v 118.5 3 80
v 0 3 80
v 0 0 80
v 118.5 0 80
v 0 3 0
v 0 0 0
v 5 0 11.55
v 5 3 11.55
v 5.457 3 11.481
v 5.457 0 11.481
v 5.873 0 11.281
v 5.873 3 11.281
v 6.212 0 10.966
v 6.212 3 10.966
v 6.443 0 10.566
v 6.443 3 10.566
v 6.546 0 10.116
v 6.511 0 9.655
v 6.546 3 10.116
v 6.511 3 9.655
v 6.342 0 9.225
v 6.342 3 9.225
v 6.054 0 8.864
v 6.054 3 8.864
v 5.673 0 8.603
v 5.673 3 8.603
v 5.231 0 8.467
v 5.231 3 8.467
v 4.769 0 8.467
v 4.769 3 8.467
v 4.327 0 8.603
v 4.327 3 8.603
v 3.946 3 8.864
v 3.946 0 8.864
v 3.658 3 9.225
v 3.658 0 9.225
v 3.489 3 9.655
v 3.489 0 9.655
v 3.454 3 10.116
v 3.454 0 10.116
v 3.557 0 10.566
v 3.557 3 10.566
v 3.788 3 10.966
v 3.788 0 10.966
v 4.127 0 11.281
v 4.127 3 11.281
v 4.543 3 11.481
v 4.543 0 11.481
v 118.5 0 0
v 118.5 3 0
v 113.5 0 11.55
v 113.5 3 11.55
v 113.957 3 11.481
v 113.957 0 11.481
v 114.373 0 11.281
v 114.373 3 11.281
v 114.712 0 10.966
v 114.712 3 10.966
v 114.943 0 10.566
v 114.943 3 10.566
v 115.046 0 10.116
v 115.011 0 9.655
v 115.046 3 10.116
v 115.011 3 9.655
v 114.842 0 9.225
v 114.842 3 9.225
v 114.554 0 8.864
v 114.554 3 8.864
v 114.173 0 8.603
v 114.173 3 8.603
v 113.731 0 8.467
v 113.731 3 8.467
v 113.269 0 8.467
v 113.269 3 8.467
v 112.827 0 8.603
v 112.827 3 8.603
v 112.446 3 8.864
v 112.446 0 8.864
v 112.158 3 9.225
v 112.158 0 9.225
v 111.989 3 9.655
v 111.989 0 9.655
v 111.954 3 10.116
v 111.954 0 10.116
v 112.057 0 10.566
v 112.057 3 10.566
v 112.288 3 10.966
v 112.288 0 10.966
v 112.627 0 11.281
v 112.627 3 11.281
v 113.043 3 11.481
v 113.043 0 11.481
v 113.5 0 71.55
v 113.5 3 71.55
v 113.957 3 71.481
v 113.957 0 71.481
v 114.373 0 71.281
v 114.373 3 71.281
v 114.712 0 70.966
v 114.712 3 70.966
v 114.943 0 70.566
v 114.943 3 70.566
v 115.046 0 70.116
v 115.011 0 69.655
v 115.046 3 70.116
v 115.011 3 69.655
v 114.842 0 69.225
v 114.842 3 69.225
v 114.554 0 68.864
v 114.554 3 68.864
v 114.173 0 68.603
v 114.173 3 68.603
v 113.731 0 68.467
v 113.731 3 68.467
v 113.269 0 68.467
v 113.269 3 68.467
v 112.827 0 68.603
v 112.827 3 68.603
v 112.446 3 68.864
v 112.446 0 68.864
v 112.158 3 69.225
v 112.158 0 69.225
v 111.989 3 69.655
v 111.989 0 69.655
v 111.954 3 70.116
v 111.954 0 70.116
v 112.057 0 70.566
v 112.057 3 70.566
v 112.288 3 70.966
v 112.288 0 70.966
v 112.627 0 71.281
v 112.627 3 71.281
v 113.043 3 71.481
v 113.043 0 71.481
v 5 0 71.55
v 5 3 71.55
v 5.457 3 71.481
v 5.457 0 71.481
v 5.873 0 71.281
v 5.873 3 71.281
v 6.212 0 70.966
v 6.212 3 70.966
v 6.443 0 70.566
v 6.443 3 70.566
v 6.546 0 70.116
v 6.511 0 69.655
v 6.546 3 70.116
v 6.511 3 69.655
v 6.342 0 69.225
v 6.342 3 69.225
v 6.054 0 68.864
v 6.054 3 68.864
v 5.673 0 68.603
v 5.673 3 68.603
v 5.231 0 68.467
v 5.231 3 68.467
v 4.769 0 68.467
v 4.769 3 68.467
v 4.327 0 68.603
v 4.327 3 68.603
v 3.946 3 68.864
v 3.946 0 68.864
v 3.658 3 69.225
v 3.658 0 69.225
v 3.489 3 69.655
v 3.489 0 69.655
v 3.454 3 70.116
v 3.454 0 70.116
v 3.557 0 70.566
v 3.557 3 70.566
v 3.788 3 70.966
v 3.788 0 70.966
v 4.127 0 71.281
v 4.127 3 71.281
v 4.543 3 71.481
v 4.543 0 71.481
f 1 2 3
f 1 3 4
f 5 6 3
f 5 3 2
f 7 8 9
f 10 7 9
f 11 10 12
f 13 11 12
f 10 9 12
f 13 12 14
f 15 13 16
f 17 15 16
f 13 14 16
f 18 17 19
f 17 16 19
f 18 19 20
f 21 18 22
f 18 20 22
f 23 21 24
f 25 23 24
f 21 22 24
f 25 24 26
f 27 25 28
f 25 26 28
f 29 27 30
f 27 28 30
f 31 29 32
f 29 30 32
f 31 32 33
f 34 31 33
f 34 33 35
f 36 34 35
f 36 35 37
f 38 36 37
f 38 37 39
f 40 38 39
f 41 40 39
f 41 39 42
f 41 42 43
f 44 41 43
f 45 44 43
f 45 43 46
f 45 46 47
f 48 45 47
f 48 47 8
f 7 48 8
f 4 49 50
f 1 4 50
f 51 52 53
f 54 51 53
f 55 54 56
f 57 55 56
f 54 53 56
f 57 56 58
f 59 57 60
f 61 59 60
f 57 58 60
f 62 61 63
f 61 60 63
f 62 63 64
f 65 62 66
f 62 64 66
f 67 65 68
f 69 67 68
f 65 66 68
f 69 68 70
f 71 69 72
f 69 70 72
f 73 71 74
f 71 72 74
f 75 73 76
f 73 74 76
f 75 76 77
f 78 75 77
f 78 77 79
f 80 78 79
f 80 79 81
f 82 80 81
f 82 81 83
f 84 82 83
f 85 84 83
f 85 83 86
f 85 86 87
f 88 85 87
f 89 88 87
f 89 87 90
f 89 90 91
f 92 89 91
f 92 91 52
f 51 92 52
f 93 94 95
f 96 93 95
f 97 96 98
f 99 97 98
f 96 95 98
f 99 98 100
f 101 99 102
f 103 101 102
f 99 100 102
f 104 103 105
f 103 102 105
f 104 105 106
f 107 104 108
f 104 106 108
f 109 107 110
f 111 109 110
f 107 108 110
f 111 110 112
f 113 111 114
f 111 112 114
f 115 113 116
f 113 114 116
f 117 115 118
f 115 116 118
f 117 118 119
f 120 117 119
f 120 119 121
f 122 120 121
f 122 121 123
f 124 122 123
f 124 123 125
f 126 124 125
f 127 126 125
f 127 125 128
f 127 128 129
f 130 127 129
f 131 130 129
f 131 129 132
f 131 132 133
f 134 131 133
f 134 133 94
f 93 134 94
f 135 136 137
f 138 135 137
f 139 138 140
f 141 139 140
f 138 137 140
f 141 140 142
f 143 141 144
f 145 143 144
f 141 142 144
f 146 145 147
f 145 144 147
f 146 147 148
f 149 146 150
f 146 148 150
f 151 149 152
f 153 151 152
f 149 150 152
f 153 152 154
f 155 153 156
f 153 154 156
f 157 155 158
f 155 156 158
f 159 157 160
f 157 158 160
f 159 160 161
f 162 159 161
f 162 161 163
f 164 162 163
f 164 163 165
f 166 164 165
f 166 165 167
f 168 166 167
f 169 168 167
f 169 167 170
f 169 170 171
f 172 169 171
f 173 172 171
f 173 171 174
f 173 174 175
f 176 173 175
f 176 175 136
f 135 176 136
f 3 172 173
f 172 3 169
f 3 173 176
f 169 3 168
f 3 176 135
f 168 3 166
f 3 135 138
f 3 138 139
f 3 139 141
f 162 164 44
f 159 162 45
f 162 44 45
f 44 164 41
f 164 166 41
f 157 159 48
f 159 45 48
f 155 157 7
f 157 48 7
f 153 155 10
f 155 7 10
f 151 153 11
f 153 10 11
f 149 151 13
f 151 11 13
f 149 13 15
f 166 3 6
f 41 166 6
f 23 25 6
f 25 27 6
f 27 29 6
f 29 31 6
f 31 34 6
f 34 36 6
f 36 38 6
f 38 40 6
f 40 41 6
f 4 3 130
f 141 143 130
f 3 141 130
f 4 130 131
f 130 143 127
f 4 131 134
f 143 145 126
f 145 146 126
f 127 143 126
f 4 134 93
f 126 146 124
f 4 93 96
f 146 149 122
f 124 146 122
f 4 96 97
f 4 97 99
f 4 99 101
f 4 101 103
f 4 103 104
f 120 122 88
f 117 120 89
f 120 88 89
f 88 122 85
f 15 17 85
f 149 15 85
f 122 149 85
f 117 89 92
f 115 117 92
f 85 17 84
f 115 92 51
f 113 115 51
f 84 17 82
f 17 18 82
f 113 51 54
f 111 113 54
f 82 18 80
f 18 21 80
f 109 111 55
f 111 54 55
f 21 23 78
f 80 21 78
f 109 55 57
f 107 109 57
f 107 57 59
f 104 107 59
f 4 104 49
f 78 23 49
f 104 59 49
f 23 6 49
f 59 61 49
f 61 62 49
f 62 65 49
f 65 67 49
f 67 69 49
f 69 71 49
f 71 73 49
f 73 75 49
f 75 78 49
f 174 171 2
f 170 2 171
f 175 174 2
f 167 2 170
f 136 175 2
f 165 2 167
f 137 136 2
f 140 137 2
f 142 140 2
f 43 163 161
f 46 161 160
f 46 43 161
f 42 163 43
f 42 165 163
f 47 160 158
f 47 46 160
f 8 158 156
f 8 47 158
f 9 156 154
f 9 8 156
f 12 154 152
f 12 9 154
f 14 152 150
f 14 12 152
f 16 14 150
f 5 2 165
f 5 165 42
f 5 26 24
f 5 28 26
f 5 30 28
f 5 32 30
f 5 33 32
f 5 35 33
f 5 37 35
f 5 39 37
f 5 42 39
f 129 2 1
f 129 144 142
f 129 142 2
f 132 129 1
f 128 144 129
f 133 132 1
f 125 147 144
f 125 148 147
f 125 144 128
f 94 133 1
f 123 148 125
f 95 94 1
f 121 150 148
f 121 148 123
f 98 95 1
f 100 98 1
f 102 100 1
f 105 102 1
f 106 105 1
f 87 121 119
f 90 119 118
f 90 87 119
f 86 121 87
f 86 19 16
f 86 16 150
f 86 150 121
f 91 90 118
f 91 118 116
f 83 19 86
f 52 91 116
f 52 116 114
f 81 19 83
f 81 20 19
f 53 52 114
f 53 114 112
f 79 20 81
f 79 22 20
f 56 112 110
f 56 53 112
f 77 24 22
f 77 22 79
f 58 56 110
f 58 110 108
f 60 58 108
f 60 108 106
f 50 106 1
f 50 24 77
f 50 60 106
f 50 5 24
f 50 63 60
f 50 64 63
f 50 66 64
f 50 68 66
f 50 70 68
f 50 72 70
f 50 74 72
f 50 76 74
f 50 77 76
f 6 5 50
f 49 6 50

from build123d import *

# Parameters (mm, degrees)
SKETCH_1_W          = 118.5
SKETCH_1_H          = 3
EXTRUDE_1_DEPTH     = 80
CUT_EXTRUDE_1_REACH = 145.008
SKETCH_2_R          = 1.55


with BuildPart() as part:
    # 草图1 → 凸台-拉伸1 (new body)
    with BuildSketch(Plane.XY):
        with Locations((59.25, 1.5)):
            Rectangle(SKETCH_1_W, SKETCH_1_H)
    extrude(amount=EXTRUDE_1_DEPTH)

    # 草图2 → 切除-拉伸1 (cut, up to next)
    with BuildSketch(Plane(origin=(0, 3, 0), x_dir=(1, 0, 0), z_dir=(0, 1, 0)), mode=Mode.PRIVATE) as cut_extrude_1_sk1:
        with Locations(Location((5, -10, 0), (0, 0, 270))):
            Circle(SKETCH_2_R)
    cut_extrude_1_tool1 = extrude(cut_extrude_1_sk1.sketch, amount=-CUT_EXTRUDE_1_REACH, mode=Mode.PRIVATE) & part.part
    # 草图2 → 切除-拉伸1 (cut, up to next)
    with BuildSketch(Plane(origin=(0, 3, 0), x_dir=(1, 0, 0), z_dir=(0, 1, 0)), mode=Mode.PRIVATE) as cut_extrude_1_sk2:
        with Locations(Location((5, -70, 0), (0, 0, 270))):
            Circle(SKETCH_2_R)
    cut_extrude_1_tool2 = extrude(cut_extrude_1_sk2.sketch, amount=-CUT_EXTRUDE_1_REACH, mode=Mode.PRIVATE) & part.part
    # 草图2 → 切除-拉伸1 (cut, up to next)
    with BuildSketch(Plane(origin=(0, 3, 0), x_dir=(1, 0, 0), z_dir=(0, 1, 0)), mode=Mode.PRIVATE) as cut_extrude_1_sk3:
        with Locations(Location((113.5, -70, 0), (0, 0, 270))):
            Circle(SKETCH_2_R)
    cut_extrude_1_tool3 = extrude(cut_extrude_1_sk3.sketch, amount=-CUT_EXTRUDE_1_REACH, mode=Mode.PRIVATE) & part.part
    # 草图2 → 切除-拉伸1 (cut, up to next)
    with BuildSketch(Plane(origin=(0, 3, 0), x_dir=(1, 0, 0), z_dir=(0, 1, 0)), mode=Mode.PRIVATE) as cut_extrude_1_sk4:
        with Locations(Location((113.5, -10, 0), (0, 0, 270))):
            Circle(SKETCH_2_R)
    cut_extrude_1_tool4 = extrude(cut_extrude_1_sk4.sketch, amount=-CUT_EXTRUDE_1_REACH, mode=Mode.PRIVATE) & part.part
    add(cut_extrude_1_tool1.solids().sort_by_distance((5, 3, 10))[0], mode=Mode.SUBTRACT)
    add(cut_extrude_1_tool2.solids().sort_by_distance((5, 3, 70))[0], mode=Mode.SUBTRACT)
    add(cut_extrude_1_tool3.solids().sort_by_distance((113.5, 3, 70))[0], mode=Mode.SUBTRACT)
    add(cut_extrude_1_tool4.solids().sort_by_distance((113.5, 3, 10))[0], mode=Mode.SUBTRACT)


solid = part.part
